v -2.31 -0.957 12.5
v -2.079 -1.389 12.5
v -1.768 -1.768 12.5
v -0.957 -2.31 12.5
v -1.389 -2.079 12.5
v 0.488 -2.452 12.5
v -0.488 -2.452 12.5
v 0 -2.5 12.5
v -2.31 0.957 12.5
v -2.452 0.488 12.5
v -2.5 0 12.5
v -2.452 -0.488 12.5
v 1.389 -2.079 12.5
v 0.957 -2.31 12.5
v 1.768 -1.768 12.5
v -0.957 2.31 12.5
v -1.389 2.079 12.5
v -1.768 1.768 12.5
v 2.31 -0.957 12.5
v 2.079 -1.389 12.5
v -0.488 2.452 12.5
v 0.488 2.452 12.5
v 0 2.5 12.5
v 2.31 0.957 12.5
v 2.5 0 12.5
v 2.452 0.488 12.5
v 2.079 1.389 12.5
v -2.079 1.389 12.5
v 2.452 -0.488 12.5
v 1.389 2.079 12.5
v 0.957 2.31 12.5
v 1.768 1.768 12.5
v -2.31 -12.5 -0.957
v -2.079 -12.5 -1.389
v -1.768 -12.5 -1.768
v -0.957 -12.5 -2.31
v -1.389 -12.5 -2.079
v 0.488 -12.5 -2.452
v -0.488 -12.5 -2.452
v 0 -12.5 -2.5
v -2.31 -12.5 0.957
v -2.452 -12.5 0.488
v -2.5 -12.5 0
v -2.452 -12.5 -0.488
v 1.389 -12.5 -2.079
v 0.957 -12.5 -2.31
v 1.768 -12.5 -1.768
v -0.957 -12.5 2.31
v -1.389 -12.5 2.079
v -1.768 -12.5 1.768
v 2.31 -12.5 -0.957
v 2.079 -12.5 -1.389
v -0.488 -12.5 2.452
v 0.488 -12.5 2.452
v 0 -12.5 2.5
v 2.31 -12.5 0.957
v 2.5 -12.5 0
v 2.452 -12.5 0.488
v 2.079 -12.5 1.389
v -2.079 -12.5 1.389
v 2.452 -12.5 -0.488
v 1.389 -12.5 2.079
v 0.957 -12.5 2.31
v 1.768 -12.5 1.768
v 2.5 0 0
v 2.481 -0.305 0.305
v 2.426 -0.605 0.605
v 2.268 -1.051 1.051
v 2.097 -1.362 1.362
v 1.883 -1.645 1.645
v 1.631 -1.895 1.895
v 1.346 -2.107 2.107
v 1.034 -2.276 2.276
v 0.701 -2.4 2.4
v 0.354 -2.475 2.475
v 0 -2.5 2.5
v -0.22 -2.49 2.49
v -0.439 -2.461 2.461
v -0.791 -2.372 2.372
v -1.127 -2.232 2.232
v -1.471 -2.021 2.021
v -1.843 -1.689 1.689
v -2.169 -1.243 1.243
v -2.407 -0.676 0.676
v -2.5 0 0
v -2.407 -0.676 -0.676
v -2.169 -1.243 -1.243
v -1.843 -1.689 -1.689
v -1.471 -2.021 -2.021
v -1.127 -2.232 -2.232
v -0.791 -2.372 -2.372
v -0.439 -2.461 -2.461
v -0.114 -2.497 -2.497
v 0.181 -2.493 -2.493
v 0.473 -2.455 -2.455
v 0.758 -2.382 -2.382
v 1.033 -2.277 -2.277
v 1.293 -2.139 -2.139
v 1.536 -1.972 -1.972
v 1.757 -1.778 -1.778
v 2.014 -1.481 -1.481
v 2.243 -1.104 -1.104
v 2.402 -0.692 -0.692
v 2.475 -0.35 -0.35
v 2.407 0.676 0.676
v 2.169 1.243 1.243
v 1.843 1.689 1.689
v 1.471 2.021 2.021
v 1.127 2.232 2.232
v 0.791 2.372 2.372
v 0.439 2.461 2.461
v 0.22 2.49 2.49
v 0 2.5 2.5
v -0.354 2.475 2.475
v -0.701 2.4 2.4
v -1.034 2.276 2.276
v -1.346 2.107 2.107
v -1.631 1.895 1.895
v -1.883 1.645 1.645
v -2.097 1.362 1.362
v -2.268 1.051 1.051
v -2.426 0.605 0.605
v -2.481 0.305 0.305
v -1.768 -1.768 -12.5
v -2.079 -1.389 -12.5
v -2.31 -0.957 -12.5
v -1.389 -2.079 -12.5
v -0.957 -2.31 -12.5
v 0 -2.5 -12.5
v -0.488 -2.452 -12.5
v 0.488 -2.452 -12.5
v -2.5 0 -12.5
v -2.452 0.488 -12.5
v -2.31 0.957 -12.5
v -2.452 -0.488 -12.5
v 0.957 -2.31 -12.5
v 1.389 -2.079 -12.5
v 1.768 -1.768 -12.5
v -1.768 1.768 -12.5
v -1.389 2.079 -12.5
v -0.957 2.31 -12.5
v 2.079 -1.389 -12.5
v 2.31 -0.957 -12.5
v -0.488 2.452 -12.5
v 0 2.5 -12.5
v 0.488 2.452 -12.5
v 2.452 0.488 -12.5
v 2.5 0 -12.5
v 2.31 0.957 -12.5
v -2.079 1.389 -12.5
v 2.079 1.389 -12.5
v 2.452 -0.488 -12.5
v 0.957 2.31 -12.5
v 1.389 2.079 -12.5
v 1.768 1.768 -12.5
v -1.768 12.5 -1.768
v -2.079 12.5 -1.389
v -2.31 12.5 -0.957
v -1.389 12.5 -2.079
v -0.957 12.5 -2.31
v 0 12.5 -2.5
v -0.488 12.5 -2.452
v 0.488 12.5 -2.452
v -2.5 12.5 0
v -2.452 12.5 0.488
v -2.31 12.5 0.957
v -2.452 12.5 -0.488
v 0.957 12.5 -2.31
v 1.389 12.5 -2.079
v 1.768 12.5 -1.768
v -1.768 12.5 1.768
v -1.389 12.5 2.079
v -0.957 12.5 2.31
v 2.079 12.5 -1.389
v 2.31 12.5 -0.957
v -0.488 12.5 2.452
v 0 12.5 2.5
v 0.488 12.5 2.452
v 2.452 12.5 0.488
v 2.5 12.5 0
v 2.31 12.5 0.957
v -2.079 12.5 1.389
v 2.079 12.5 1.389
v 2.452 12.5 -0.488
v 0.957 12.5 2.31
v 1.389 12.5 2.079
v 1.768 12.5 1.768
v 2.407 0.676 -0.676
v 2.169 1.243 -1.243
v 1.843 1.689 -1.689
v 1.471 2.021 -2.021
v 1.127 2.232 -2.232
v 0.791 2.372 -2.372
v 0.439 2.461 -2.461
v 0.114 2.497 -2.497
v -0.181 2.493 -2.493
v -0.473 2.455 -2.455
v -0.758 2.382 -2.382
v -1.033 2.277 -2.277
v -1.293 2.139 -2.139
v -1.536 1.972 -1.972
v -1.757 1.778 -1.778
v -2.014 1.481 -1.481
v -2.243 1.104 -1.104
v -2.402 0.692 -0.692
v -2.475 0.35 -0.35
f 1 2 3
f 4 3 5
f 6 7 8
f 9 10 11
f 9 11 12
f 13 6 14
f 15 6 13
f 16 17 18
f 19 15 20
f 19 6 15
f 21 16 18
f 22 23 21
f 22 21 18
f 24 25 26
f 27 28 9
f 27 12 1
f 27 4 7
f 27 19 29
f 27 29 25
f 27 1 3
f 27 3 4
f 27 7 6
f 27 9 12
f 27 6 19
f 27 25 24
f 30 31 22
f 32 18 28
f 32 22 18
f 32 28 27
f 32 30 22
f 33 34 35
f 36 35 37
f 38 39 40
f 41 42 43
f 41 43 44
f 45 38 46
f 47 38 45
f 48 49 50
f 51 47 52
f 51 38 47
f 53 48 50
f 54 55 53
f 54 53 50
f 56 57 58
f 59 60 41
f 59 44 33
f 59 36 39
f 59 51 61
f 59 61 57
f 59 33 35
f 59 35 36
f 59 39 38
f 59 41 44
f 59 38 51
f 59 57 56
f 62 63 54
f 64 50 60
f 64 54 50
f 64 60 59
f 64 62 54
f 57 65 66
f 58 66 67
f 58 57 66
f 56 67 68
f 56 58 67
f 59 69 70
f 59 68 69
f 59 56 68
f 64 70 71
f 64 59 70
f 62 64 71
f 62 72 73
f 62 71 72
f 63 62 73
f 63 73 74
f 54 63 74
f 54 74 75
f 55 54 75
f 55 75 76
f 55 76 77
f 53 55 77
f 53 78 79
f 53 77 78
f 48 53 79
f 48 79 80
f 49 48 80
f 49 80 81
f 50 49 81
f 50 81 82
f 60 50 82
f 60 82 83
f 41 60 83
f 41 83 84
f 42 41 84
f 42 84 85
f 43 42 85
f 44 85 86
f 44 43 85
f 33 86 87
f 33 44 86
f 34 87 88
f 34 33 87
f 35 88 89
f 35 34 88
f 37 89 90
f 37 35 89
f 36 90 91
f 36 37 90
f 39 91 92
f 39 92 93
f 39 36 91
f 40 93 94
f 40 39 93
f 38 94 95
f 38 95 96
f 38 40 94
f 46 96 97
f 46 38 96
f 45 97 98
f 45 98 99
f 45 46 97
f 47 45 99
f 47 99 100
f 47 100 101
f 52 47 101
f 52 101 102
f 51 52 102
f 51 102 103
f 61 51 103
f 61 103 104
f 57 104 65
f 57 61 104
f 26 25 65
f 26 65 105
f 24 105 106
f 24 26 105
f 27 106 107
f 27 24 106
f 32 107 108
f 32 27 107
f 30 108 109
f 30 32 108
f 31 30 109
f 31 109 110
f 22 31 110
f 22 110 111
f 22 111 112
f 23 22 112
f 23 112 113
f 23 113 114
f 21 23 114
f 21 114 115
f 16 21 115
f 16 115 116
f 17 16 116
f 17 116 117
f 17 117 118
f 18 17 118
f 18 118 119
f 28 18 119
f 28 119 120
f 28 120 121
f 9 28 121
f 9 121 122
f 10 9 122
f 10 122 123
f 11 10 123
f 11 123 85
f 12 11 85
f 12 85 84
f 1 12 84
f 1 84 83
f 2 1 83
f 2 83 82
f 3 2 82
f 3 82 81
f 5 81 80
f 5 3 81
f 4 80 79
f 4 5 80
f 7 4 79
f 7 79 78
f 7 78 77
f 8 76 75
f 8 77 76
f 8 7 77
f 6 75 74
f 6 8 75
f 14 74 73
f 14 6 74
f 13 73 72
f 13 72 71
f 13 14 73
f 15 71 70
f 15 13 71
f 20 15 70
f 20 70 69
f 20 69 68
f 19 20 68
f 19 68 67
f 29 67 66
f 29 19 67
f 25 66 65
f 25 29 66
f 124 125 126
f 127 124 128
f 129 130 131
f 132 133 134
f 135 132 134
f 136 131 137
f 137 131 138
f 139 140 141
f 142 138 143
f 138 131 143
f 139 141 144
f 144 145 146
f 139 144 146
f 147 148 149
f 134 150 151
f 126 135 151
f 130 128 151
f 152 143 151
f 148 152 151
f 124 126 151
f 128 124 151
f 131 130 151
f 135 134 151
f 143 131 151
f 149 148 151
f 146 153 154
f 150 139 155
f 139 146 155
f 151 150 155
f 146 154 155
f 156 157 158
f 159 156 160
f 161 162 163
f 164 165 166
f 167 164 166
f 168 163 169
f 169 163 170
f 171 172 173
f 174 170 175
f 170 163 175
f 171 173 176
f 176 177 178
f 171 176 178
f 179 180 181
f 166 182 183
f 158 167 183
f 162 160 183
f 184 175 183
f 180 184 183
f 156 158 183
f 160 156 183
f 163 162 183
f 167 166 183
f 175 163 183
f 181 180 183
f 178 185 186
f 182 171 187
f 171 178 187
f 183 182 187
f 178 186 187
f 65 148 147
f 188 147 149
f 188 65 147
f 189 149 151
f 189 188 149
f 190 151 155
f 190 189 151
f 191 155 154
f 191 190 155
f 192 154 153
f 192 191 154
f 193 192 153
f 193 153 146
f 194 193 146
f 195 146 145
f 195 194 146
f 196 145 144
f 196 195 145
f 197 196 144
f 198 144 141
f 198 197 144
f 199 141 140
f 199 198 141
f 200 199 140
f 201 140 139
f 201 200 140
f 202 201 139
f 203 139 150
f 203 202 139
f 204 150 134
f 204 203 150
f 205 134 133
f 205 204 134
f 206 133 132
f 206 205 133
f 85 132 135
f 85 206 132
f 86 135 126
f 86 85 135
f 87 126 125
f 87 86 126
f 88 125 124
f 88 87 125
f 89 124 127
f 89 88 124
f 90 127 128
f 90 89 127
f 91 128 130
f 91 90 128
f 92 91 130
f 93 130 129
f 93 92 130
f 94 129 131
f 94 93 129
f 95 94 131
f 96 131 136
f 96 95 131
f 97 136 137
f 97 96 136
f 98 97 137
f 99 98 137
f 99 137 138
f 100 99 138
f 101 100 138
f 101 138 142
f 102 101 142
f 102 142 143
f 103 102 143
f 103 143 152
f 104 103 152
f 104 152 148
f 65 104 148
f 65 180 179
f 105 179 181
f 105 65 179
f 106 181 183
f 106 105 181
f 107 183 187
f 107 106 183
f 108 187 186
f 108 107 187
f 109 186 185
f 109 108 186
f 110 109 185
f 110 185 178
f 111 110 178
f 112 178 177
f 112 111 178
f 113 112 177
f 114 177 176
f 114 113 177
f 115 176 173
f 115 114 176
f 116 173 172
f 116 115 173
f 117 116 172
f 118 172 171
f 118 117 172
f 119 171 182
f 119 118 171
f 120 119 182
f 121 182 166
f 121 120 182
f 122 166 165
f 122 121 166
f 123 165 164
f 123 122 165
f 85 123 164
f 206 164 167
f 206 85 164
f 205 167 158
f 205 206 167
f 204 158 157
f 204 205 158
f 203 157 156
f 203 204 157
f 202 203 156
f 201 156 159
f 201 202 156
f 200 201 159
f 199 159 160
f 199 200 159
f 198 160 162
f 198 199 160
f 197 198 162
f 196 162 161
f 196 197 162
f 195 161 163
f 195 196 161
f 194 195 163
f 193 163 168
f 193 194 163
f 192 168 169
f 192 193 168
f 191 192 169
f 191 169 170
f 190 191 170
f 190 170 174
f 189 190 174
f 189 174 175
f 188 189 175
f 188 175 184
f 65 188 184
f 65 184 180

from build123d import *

# Parameters (mm, degrees)
F0_R     = 2.5
F1_DEPTH = 12.5
F2_R     = 2.5
F3_DEPTH = 12.5


with BuildPart() as f1:
    # F0 (on Top) → F1 (new body, symmetric)
    with BuildSketch(Plane.XY):
        Circle(F0_R)
    extrude(amount=F1_DEPTH, both=True)

    # F2 (on Front) → F3 (join, symmetric)
    with BuildSketch(Plane.XZ):
        Circle(F2_R)
    extrude(amount=F3_DEPTH, both=True)


solid = f1.part
